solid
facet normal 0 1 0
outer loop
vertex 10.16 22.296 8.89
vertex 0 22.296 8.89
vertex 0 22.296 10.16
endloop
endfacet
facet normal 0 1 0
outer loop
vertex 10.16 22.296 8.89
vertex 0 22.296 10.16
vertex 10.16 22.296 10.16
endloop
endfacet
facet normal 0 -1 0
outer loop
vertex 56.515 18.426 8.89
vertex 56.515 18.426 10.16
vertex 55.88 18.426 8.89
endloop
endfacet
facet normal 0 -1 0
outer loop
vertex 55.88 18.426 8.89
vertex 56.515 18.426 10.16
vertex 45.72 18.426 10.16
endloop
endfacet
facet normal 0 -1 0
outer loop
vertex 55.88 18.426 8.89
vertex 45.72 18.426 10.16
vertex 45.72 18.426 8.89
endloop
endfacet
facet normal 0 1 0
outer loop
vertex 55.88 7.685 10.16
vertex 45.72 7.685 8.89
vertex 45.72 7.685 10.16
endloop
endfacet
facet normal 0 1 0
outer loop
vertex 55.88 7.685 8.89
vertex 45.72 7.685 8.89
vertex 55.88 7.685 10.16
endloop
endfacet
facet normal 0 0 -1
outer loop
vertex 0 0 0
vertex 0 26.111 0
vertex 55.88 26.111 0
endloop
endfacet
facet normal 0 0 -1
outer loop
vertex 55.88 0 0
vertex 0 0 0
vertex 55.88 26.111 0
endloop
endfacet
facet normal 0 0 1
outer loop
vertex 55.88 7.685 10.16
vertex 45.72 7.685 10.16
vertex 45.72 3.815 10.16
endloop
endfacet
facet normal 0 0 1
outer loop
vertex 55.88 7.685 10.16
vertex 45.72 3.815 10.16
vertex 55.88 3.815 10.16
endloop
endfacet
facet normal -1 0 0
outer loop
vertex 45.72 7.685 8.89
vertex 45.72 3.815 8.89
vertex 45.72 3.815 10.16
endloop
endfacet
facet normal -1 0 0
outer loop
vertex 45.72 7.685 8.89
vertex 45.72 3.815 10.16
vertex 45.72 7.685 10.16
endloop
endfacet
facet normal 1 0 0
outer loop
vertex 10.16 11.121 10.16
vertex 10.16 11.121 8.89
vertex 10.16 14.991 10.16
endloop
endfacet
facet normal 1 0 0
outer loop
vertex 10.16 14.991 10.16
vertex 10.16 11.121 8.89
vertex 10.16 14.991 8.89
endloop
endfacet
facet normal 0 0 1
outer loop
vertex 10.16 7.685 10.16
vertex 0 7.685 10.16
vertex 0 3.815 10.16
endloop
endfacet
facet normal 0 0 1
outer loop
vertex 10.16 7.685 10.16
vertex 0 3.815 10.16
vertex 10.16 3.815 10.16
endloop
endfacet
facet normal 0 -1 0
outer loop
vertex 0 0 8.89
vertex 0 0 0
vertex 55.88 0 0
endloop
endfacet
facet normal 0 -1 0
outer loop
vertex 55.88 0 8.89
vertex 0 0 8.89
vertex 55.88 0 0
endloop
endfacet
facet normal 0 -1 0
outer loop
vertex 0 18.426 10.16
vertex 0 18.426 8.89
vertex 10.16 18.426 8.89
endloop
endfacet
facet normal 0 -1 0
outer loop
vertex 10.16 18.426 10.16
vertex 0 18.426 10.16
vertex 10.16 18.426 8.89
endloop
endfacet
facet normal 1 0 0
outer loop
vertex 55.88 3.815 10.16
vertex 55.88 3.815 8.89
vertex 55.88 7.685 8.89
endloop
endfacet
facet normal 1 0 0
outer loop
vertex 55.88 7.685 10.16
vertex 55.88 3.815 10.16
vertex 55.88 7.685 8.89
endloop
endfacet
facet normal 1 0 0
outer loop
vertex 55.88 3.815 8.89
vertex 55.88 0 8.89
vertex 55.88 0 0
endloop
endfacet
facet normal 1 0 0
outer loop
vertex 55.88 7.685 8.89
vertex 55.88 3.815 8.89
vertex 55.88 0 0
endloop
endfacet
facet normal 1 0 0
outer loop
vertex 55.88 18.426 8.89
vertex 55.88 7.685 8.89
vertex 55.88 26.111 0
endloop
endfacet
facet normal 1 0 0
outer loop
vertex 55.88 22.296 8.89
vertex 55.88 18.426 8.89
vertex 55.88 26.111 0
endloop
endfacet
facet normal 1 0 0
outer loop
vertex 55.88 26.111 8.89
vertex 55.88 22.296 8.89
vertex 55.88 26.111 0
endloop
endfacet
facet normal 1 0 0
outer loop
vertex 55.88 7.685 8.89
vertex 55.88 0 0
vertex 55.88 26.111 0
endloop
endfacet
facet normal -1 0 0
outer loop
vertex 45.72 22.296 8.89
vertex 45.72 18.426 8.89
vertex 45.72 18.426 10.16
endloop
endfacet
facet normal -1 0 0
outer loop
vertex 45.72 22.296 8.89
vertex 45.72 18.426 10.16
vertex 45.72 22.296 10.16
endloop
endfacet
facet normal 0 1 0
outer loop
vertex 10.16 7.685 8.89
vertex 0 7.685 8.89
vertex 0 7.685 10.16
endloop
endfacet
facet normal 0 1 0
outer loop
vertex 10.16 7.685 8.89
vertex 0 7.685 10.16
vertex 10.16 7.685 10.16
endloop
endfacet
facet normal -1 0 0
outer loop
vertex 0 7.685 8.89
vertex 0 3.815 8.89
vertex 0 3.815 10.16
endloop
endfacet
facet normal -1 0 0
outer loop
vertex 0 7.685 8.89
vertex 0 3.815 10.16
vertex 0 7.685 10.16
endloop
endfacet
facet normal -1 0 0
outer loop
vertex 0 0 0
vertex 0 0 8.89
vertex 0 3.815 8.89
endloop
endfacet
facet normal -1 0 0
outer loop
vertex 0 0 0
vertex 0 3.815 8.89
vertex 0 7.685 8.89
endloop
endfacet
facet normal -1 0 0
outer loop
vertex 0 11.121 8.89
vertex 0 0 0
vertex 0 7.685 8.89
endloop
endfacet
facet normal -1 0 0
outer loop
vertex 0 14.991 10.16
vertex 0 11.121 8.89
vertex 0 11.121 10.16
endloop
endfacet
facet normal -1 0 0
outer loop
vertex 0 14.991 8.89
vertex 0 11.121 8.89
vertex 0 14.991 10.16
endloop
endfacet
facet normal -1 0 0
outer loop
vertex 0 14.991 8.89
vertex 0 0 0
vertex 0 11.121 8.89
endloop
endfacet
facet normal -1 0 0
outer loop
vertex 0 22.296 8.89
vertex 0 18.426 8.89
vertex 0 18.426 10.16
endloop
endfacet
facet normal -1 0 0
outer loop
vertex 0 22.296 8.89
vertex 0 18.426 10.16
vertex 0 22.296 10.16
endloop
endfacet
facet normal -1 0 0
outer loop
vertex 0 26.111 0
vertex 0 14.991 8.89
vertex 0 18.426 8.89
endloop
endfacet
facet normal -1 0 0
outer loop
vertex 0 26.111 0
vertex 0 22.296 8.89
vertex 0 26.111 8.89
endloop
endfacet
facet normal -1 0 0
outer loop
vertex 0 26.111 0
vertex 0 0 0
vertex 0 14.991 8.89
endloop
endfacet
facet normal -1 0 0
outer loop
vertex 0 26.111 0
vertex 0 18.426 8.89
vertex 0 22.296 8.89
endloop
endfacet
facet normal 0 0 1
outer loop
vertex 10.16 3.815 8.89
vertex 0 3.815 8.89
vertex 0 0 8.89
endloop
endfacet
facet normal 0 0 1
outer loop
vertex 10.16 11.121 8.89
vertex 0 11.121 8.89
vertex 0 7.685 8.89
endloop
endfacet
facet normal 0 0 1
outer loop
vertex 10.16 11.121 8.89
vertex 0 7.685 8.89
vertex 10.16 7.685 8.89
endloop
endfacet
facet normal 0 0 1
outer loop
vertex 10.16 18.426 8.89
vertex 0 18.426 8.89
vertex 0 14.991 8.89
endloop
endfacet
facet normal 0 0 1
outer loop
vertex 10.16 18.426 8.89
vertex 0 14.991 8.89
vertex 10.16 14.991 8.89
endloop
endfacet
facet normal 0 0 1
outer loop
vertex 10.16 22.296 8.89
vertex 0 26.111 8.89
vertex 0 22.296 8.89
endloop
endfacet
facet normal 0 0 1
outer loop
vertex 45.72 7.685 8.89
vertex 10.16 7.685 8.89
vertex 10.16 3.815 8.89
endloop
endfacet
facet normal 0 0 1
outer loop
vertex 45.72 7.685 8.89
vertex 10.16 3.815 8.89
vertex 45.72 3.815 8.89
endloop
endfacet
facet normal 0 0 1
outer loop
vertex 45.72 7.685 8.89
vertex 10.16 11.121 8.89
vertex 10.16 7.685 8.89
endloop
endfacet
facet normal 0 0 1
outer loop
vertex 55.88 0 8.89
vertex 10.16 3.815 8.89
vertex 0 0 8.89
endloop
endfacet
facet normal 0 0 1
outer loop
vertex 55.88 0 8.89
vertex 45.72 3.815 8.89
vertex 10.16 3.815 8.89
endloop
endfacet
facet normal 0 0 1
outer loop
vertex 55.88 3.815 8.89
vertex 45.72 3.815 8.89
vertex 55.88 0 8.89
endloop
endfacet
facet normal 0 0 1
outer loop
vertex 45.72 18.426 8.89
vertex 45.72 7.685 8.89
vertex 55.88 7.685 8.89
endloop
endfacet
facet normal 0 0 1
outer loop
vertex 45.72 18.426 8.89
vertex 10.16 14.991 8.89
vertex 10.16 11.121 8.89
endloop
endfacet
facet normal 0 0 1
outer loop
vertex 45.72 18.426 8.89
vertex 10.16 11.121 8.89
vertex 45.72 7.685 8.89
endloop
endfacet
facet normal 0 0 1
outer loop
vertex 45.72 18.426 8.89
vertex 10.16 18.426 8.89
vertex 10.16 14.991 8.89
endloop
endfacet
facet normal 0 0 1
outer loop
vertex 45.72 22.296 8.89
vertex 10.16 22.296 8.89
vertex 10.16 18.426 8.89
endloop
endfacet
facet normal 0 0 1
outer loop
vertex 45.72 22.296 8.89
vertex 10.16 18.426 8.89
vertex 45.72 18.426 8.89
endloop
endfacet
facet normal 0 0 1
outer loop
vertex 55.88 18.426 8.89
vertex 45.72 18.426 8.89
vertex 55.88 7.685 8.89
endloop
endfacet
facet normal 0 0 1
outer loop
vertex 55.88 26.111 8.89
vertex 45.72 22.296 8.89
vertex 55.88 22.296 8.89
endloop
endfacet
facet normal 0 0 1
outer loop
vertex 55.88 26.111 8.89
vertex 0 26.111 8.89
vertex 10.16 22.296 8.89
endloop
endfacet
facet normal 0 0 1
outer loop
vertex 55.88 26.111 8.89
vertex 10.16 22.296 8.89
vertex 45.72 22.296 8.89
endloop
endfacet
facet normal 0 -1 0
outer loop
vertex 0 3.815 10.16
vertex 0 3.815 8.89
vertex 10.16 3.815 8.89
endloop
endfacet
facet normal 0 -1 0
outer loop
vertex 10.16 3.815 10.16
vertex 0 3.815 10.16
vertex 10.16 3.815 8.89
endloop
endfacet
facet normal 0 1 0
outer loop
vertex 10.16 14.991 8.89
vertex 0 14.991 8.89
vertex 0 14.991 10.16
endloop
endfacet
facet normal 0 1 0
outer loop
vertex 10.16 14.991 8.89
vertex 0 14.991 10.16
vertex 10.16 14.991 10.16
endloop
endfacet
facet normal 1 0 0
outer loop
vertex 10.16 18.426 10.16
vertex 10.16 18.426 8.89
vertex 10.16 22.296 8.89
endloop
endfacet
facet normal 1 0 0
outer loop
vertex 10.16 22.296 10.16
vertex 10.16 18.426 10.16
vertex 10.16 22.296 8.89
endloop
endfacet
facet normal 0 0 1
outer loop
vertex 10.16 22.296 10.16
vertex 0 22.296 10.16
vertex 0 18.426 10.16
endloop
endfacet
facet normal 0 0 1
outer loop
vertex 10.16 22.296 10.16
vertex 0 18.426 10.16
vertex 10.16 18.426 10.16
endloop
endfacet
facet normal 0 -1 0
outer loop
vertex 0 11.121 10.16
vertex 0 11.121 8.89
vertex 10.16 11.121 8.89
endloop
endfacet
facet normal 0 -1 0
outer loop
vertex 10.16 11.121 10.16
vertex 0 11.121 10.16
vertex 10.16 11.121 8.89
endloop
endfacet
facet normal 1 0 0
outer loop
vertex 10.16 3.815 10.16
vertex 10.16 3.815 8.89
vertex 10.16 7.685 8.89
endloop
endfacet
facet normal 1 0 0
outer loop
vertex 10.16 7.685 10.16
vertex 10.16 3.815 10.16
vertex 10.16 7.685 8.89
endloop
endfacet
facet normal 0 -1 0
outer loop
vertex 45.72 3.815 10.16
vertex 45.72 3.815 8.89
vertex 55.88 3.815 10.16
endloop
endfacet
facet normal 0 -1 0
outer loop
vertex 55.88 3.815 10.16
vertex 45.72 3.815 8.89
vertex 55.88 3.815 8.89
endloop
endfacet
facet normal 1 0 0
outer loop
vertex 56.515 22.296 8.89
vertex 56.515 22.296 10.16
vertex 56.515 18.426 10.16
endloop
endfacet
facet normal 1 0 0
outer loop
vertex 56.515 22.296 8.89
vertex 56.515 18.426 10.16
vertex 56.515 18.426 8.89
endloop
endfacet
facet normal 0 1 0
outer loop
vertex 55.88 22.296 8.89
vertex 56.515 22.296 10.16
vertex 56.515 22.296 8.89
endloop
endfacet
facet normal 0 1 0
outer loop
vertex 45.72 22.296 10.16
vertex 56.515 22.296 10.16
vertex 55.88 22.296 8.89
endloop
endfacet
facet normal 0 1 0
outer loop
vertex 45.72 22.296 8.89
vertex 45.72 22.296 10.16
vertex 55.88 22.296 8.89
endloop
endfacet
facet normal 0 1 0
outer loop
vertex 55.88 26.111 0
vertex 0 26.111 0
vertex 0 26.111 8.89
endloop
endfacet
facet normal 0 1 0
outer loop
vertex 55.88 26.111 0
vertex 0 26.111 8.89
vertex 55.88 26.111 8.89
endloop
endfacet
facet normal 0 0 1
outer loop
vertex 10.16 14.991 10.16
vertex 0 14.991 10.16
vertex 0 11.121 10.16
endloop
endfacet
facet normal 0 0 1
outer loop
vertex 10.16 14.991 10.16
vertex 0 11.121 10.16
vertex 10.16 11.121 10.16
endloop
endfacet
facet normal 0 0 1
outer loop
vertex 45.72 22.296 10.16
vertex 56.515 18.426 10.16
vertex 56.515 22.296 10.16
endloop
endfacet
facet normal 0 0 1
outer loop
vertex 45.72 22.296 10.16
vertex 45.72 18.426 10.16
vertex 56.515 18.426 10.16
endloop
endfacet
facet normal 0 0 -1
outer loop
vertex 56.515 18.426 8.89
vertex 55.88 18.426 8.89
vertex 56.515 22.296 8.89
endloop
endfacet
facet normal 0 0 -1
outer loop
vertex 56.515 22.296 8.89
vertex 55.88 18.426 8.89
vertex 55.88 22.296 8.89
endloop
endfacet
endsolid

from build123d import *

# Parameters (mm, degrees)
SKETCH1_W           = 55.88
SKETCH1_H           = 26.1112
BOSS_EXTRUDE1_DEPTH = 8.89
SKETCH2_W           = 10.16
SKETCH2_H           = 3.869870213
SKETCH2_H_2         = 3.869870212
BOSS_EXTRUDE2_DEPTH = 1.27
SKETCH3_W           = 1.27
SKETCH3_H           = 3.869870213
BOSS_EXTRUDE3_DEPTH = 0.635


with BuildPart() as part:
    # Sketch1 → Boss-Extrude1 (new body)
    with BuildSketch(Plane.XY):
        with Locations((27.94, 13.0556)):
            Rectangle(SKETCH1_W, SKETCH1_H)
    extrude(amount=BOSS_EXTRUDE1_DEPTH)

    # Sketch2 → Boss-Extrude2 (add)
    with BuildSketch(Plane.XY.offset(8.89)):
        with Locations((5.08, 5.750232763)):
            Rectangle(SKETCH2_W, SKETCH2_H)
        with Locations((5.08, 13.0556)):
            Rectangle(SKETCH2_W, SKETCH2_H_2)
        with Locations((5.08, 20.360967237)):
            Rectangle(SKETCH2_W, SKETCH2_H)
        with Locations((50.8, 5.750232763)):
            Rectangle(SKETCH2_W, SKETCH2_H)
        with Locations((50.8, 20.360967237)):
            Rectangle(SKETCH2_W, SKETCH2_H)
    extrude(amount=BOSS_EXTRUDE2_DEPTH)

    # Sketch3 → Boss-Extrude3 (add)
    with BuildSketch(Plane(origin=(55.88, 0, 0), x_dir=(0, 0, -1), z_dir=(1, 0, 0))):
        with Locations((-9.525, 20.360967237)):
            Rectangle(SKETCH3_W, SKETCH3_H)
    extrude(amount=BOSS_EXTRUDE3_DEPTH)


solid = part.part
